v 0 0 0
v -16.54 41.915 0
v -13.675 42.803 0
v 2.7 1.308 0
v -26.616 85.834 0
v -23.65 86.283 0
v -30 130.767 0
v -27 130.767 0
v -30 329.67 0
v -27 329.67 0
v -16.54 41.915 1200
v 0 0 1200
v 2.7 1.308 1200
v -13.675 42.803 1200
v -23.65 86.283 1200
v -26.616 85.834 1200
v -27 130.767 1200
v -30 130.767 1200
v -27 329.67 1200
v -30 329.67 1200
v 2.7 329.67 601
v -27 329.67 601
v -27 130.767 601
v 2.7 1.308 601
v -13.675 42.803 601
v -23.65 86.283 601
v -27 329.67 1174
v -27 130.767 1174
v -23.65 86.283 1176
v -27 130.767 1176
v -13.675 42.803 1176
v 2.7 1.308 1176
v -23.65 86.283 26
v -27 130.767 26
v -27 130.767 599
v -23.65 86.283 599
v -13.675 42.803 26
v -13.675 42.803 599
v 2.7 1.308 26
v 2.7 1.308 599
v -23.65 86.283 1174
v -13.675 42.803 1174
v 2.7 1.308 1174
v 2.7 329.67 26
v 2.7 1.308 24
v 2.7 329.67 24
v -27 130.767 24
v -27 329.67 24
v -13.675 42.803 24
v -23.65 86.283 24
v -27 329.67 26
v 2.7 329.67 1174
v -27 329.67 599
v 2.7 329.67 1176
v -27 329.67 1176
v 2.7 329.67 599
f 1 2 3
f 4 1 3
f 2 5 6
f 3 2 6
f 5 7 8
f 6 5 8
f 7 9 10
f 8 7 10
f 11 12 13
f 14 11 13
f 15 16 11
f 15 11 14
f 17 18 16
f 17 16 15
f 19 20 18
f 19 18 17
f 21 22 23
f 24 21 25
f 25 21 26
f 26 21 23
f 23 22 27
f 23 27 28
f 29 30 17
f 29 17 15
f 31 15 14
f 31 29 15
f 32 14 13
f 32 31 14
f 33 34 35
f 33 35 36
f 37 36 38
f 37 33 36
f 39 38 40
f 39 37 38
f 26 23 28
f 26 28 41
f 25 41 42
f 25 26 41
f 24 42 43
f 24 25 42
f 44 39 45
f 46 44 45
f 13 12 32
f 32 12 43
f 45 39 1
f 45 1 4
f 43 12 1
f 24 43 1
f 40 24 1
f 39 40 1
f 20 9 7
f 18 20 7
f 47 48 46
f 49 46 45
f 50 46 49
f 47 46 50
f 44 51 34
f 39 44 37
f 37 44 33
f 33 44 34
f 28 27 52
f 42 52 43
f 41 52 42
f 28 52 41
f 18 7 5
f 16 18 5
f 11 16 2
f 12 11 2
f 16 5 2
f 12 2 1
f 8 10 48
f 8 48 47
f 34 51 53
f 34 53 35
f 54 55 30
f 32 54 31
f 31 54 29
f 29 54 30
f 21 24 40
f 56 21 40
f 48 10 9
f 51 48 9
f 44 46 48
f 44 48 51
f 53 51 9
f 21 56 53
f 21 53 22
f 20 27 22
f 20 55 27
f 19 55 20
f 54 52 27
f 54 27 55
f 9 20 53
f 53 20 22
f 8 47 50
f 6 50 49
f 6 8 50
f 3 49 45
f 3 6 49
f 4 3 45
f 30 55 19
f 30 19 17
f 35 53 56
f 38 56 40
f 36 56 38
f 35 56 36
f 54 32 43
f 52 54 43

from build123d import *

# Parameters (mm, degrees)
SURFACE_EXTRUDE1_1_DEPTH = 1200
THICKEN1_T1              = 3
BOSS_EXTRUDE1_REACH      = 1246.822
SKETCH2_W                = 29.7
SKETCH2_H                = 2


with BuildPart() as body_1:
    # Surface-Extrude1: a surface, the sketch's curves swept straight by 1200 mm
    with BuildLine(Plane.XY, mode=Mode.PRIVATE) as surface_extrude1_1_path:
        Line((-30, 329.67), (-30, 130.766968306))
        ThreePointArc((-30, 130.766968306), (-22.403830344, 63.684928981), (0, 0))
    surface_extrude1_1 = Shell.extrude(surface_extrude1_1_path.wire(), (0 * SURFACE_EXTRUDE1_1_DEPTH, 0 * SURFACE_EXTRUDE1_1_DEPTH, 1 * SURFACE_EXTRUDE1_1_DEPTH))
    add(Solid.thicken(surface_extrude1_1, THICKEN1_T1))

    # Sketch2 → Boss-Extrude1 (add, up to next)
    with BuildSketch(Plane(origin=(0, 329.67, 0), x_dir=(1, 0, 0), z_dir=(0, 1, 0)), mode=Mode.PRIVATE) as boss_extrude1_sk1:
        with Locations((-12.15, -1175)):
            Rectangle(SKETCH2_W, SKETCH2_H)
    boss_extrude1_tool1 = extrude(boss_extrude1_sk1.sketch, amount=-BOSS_EXTRUDE1_REACH, mode=Mode.PRIVATE) - body_1.part
    # Sketch2 → Boss-Extrude1 (add, up to next)
    with BuildSketch(Plane(origin=(0, 329.67, 0), x_dir=(1, 0, 0), z_dir=(0, 1, 0)), mode=Mode.PRIVATE) as boss_extrude1_sk2:
        with Locations((-12.15, -600)):
            Rectangle(SKETCH2_W, SKETCH2_H)
    boss_extrude1_tool2 = extrude(boss_extrude1_sk2.sketch, amount=-BOSS_EXTRUDE1_REACH, mode=Mode.PRIVATE) - body_1.part
    # Sketch2 → Boss-Extrude1 (add, up to next)
    with BuildSketch(Plane(origin=(0, 329.67, 0), x_dir=(1, 0, 0), z_dir=(0, 1, 0)), mode=Mode.PRIVATE) as boss_extrude1_sk3:
        with Locations((-12.15, -25)):
            Rectangle(SKETCH2_W, SKETCH2_H)
    boss_extrude1_tool3 = extrude(boss_extrude1_sk3.sketch, amount=-BOSS_EXTRUDE1_REACH, mode=Mode.PRIVATE) - body_1.part
    add(boss_extrude1_tool1.solids().sort_by_distance((-12.15, 329.67, 1175))[0])
    add(boss_extrude1_tool2.solids().sort_by_distance((-12.15, 329.67, 600))[0])
    add(boss_extrude1_tool3.solids().sort_by_distance((-12.15, 329.67, 25))[0])


solid = body_1.part
